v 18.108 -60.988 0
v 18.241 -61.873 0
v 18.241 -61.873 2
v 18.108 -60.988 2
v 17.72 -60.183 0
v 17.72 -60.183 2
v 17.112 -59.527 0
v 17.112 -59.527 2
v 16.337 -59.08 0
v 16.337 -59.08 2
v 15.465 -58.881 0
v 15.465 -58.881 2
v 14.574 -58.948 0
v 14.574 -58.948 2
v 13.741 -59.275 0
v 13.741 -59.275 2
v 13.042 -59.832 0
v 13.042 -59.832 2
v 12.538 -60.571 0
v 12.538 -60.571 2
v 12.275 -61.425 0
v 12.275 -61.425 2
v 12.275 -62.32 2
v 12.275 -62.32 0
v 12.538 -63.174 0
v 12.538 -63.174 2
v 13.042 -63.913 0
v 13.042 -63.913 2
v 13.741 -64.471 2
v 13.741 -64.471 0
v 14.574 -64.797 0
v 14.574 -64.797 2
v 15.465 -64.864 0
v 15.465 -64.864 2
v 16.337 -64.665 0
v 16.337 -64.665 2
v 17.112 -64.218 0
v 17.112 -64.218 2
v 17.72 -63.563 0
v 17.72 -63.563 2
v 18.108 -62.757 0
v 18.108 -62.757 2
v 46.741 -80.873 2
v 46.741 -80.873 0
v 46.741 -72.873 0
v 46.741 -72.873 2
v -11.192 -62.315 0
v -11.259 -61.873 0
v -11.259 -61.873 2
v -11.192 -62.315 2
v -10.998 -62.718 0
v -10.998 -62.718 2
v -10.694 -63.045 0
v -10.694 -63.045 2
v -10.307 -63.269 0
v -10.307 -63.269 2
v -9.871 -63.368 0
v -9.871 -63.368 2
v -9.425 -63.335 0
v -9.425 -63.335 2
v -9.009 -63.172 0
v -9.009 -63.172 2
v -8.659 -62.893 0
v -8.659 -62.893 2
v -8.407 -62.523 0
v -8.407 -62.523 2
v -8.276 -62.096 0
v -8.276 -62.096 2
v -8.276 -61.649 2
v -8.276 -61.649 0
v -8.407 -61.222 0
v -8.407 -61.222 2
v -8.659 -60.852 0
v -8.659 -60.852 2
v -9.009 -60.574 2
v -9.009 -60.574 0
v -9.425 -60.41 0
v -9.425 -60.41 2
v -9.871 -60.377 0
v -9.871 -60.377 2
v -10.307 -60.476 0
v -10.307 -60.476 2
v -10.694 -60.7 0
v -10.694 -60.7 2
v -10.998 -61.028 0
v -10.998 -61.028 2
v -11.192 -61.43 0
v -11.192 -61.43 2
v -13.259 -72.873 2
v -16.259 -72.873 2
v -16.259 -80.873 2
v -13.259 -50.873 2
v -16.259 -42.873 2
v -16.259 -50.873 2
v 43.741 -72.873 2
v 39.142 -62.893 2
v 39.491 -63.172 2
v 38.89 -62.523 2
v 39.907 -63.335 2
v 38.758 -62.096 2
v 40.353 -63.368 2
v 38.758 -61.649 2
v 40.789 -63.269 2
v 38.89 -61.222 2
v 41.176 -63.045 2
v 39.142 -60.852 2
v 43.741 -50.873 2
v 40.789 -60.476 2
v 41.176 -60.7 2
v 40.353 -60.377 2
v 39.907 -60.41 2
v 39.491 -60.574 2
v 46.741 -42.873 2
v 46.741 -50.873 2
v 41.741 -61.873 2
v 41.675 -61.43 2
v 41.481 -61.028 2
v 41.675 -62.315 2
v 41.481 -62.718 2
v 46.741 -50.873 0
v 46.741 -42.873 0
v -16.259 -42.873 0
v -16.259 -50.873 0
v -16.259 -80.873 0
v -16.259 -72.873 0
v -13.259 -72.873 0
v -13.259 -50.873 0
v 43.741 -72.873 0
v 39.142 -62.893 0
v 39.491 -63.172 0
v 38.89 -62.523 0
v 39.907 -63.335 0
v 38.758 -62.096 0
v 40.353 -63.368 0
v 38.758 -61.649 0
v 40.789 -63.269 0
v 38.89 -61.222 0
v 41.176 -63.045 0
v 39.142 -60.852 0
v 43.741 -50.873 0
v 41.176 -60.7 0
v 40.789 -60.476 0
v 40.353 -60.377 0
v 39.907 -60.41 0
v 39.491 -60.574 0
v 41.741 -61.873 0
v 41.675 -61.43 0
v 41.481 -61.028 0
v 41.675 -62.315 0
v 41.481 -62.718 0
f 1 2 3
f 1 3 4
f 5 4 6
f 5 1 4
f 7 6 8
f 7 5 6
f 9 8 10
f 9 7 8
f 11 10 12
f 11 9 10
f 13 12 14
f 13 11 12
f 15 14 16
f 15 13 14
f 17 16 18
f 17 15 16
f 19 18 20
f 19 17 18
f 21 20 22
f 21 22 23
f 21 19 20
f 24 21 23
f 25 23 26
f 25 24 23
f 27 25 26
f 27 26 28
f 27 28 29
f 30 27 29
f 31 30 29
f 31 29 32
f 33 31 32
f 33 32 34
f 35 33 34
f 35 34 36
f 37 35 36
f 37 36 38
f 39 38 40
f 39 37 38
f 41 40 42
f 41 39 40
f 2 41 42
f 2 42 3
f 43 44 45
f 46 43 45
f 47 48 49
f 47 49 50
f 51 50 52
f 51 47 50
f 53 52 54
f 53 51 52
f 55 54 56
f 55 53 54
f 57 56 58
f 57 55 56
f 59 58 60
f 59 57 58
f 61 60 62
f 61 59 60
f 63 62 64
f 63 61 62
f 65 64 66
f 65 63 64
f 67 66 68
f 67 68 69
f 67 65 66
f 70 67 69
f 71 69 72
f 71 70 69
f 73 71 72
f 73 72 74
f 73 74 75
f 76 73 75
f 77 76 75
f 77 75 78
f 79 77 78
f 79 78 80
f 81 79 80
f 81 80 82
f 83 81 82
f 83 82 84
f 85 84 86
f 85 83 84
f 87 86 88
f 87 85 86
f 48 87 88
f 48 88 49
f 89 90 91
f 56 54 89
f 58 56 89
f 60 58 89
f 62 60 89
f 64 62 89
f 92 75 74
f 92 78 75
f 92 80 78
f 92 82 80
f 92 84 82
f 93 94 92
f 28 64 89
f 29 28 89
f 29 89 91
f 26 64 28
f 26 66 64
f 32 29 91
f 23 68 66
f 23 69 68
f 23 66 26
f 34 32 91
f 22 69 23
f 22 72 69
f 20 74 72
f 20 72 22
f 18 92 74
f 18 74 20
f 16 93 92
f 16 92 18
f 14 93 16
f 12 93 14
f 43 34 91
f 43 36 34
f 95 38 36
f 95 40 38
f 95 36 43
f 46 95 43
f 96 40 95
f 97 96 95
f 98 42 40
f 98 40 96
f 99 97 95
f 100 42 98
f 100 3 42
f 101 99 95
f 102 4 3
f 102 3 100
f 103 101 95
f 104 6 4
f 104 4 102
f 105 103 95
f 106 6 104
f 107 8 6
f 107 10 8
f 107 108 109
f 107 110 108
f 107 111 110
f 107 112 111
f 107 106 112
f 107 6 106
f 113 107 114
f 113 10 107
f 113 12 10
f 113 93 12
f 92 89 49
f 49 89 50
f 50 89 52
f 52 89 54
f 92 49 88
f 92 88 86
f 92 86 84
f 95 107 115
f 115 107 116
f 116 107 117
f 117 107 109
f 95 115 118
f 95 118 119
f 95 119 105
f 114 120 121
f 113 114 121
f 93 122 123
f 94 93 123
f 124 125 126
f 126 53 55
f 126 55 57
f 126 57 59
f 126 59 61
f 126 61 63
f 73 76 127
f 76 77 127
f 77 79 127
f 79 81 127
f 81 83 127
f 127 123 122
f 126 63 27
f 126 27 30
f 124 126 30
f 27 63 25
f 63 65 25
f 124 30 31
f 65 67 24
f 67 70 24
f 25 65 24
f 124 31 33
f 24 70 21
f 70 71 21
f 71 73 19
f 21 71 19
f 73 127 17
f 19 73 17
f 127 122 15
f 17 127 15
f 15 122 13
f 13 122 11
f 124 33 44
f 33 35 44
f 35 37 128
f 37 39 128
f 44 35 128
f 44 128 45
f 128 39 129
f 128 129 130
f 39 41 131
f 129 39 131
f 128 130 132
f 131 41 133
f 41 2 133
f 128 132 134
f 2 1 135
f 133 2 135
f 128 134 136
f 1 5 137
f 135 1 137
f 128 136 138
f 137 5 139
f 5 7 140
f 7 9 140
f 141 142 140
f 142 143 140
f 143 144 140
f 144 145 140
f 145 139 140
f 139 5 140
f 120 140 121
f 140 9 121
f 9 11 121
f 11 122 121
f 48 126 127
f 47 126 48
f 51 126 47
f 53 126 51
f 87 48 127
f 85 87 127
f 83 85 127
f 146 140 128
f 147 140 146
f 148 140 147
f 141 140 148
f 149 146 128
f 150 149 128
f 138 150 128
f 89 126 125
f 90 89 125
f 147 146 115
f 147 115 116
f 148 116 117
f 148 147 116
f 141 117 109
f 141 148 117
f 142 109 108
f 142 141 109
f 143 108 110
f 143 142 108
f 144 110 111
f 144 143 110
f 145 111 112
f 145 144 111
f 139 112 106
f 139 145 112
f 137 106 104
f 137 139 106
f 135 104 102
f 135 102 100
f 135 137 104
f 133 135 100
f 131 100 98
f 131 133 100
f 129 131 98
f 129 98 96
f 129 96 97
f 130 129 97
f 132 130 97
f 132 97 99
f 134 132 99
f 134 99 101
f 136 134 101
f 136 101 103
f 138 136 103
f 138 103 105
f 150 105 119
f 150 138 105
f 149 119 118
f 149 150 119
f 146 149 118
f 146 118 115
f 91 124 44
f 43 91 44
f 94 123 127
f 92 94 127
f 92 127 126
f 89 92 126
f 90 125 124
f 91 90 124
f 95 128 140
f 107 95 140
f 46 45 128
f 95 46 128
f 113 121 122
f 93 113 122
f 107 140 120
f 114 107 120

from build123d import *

# Parameters (mm, degrees)
SKETCH_1_R      = 3
SKETCH_1_R_2    = 1.5
EXTRUDE_1_DEPTH = 2


with BuildPart() as part:
    # 草图1 → 凸台-拉伸1 (new body)
    with BuildSketch(Plane.XY):
        Polygon((-13.258857042, -42.872599913), (-16.258857042, -42.872599913), (-16.258857042, -50.872599913), (-13.258857042, -50.872599913), (-13.258857042, -72.872599913), (-16.258857042, -72.872599913), (-16.258857042, -80.872599913), (-13.258857042, -80.872599913), (43.741142958, -80.872599913), (46.741142958, -80.872599913), (46.741142958, -72.872599913), (43.741142958, -72.872599913), (43.741142958, -50.872599913), (46.741142958, -50.872599913), (46.741142958, -42.872599913), (43.741142958, -42.872599913), (15.241142958, -42.872599913), align=None)
        with Locations((15.241142958, -61.872599913)):
            Circle(SKETCH_1_R, mode=Mode.SUBTRACT)
        with Locations((40.241142958, -61.872599913)):
            Circle(SKETCH_1_R_2, mode=Mode.SUBTRACT)
        with Locations(Location((-9.758857042, -61.872599913, 0), (0, 0, 180))):
            Circle(SKETCH_1_R_2, mode=Mode.SUBTRACT)
    extrude(amount=EXTRUDE_1_DEPTH)


solid = part.part
